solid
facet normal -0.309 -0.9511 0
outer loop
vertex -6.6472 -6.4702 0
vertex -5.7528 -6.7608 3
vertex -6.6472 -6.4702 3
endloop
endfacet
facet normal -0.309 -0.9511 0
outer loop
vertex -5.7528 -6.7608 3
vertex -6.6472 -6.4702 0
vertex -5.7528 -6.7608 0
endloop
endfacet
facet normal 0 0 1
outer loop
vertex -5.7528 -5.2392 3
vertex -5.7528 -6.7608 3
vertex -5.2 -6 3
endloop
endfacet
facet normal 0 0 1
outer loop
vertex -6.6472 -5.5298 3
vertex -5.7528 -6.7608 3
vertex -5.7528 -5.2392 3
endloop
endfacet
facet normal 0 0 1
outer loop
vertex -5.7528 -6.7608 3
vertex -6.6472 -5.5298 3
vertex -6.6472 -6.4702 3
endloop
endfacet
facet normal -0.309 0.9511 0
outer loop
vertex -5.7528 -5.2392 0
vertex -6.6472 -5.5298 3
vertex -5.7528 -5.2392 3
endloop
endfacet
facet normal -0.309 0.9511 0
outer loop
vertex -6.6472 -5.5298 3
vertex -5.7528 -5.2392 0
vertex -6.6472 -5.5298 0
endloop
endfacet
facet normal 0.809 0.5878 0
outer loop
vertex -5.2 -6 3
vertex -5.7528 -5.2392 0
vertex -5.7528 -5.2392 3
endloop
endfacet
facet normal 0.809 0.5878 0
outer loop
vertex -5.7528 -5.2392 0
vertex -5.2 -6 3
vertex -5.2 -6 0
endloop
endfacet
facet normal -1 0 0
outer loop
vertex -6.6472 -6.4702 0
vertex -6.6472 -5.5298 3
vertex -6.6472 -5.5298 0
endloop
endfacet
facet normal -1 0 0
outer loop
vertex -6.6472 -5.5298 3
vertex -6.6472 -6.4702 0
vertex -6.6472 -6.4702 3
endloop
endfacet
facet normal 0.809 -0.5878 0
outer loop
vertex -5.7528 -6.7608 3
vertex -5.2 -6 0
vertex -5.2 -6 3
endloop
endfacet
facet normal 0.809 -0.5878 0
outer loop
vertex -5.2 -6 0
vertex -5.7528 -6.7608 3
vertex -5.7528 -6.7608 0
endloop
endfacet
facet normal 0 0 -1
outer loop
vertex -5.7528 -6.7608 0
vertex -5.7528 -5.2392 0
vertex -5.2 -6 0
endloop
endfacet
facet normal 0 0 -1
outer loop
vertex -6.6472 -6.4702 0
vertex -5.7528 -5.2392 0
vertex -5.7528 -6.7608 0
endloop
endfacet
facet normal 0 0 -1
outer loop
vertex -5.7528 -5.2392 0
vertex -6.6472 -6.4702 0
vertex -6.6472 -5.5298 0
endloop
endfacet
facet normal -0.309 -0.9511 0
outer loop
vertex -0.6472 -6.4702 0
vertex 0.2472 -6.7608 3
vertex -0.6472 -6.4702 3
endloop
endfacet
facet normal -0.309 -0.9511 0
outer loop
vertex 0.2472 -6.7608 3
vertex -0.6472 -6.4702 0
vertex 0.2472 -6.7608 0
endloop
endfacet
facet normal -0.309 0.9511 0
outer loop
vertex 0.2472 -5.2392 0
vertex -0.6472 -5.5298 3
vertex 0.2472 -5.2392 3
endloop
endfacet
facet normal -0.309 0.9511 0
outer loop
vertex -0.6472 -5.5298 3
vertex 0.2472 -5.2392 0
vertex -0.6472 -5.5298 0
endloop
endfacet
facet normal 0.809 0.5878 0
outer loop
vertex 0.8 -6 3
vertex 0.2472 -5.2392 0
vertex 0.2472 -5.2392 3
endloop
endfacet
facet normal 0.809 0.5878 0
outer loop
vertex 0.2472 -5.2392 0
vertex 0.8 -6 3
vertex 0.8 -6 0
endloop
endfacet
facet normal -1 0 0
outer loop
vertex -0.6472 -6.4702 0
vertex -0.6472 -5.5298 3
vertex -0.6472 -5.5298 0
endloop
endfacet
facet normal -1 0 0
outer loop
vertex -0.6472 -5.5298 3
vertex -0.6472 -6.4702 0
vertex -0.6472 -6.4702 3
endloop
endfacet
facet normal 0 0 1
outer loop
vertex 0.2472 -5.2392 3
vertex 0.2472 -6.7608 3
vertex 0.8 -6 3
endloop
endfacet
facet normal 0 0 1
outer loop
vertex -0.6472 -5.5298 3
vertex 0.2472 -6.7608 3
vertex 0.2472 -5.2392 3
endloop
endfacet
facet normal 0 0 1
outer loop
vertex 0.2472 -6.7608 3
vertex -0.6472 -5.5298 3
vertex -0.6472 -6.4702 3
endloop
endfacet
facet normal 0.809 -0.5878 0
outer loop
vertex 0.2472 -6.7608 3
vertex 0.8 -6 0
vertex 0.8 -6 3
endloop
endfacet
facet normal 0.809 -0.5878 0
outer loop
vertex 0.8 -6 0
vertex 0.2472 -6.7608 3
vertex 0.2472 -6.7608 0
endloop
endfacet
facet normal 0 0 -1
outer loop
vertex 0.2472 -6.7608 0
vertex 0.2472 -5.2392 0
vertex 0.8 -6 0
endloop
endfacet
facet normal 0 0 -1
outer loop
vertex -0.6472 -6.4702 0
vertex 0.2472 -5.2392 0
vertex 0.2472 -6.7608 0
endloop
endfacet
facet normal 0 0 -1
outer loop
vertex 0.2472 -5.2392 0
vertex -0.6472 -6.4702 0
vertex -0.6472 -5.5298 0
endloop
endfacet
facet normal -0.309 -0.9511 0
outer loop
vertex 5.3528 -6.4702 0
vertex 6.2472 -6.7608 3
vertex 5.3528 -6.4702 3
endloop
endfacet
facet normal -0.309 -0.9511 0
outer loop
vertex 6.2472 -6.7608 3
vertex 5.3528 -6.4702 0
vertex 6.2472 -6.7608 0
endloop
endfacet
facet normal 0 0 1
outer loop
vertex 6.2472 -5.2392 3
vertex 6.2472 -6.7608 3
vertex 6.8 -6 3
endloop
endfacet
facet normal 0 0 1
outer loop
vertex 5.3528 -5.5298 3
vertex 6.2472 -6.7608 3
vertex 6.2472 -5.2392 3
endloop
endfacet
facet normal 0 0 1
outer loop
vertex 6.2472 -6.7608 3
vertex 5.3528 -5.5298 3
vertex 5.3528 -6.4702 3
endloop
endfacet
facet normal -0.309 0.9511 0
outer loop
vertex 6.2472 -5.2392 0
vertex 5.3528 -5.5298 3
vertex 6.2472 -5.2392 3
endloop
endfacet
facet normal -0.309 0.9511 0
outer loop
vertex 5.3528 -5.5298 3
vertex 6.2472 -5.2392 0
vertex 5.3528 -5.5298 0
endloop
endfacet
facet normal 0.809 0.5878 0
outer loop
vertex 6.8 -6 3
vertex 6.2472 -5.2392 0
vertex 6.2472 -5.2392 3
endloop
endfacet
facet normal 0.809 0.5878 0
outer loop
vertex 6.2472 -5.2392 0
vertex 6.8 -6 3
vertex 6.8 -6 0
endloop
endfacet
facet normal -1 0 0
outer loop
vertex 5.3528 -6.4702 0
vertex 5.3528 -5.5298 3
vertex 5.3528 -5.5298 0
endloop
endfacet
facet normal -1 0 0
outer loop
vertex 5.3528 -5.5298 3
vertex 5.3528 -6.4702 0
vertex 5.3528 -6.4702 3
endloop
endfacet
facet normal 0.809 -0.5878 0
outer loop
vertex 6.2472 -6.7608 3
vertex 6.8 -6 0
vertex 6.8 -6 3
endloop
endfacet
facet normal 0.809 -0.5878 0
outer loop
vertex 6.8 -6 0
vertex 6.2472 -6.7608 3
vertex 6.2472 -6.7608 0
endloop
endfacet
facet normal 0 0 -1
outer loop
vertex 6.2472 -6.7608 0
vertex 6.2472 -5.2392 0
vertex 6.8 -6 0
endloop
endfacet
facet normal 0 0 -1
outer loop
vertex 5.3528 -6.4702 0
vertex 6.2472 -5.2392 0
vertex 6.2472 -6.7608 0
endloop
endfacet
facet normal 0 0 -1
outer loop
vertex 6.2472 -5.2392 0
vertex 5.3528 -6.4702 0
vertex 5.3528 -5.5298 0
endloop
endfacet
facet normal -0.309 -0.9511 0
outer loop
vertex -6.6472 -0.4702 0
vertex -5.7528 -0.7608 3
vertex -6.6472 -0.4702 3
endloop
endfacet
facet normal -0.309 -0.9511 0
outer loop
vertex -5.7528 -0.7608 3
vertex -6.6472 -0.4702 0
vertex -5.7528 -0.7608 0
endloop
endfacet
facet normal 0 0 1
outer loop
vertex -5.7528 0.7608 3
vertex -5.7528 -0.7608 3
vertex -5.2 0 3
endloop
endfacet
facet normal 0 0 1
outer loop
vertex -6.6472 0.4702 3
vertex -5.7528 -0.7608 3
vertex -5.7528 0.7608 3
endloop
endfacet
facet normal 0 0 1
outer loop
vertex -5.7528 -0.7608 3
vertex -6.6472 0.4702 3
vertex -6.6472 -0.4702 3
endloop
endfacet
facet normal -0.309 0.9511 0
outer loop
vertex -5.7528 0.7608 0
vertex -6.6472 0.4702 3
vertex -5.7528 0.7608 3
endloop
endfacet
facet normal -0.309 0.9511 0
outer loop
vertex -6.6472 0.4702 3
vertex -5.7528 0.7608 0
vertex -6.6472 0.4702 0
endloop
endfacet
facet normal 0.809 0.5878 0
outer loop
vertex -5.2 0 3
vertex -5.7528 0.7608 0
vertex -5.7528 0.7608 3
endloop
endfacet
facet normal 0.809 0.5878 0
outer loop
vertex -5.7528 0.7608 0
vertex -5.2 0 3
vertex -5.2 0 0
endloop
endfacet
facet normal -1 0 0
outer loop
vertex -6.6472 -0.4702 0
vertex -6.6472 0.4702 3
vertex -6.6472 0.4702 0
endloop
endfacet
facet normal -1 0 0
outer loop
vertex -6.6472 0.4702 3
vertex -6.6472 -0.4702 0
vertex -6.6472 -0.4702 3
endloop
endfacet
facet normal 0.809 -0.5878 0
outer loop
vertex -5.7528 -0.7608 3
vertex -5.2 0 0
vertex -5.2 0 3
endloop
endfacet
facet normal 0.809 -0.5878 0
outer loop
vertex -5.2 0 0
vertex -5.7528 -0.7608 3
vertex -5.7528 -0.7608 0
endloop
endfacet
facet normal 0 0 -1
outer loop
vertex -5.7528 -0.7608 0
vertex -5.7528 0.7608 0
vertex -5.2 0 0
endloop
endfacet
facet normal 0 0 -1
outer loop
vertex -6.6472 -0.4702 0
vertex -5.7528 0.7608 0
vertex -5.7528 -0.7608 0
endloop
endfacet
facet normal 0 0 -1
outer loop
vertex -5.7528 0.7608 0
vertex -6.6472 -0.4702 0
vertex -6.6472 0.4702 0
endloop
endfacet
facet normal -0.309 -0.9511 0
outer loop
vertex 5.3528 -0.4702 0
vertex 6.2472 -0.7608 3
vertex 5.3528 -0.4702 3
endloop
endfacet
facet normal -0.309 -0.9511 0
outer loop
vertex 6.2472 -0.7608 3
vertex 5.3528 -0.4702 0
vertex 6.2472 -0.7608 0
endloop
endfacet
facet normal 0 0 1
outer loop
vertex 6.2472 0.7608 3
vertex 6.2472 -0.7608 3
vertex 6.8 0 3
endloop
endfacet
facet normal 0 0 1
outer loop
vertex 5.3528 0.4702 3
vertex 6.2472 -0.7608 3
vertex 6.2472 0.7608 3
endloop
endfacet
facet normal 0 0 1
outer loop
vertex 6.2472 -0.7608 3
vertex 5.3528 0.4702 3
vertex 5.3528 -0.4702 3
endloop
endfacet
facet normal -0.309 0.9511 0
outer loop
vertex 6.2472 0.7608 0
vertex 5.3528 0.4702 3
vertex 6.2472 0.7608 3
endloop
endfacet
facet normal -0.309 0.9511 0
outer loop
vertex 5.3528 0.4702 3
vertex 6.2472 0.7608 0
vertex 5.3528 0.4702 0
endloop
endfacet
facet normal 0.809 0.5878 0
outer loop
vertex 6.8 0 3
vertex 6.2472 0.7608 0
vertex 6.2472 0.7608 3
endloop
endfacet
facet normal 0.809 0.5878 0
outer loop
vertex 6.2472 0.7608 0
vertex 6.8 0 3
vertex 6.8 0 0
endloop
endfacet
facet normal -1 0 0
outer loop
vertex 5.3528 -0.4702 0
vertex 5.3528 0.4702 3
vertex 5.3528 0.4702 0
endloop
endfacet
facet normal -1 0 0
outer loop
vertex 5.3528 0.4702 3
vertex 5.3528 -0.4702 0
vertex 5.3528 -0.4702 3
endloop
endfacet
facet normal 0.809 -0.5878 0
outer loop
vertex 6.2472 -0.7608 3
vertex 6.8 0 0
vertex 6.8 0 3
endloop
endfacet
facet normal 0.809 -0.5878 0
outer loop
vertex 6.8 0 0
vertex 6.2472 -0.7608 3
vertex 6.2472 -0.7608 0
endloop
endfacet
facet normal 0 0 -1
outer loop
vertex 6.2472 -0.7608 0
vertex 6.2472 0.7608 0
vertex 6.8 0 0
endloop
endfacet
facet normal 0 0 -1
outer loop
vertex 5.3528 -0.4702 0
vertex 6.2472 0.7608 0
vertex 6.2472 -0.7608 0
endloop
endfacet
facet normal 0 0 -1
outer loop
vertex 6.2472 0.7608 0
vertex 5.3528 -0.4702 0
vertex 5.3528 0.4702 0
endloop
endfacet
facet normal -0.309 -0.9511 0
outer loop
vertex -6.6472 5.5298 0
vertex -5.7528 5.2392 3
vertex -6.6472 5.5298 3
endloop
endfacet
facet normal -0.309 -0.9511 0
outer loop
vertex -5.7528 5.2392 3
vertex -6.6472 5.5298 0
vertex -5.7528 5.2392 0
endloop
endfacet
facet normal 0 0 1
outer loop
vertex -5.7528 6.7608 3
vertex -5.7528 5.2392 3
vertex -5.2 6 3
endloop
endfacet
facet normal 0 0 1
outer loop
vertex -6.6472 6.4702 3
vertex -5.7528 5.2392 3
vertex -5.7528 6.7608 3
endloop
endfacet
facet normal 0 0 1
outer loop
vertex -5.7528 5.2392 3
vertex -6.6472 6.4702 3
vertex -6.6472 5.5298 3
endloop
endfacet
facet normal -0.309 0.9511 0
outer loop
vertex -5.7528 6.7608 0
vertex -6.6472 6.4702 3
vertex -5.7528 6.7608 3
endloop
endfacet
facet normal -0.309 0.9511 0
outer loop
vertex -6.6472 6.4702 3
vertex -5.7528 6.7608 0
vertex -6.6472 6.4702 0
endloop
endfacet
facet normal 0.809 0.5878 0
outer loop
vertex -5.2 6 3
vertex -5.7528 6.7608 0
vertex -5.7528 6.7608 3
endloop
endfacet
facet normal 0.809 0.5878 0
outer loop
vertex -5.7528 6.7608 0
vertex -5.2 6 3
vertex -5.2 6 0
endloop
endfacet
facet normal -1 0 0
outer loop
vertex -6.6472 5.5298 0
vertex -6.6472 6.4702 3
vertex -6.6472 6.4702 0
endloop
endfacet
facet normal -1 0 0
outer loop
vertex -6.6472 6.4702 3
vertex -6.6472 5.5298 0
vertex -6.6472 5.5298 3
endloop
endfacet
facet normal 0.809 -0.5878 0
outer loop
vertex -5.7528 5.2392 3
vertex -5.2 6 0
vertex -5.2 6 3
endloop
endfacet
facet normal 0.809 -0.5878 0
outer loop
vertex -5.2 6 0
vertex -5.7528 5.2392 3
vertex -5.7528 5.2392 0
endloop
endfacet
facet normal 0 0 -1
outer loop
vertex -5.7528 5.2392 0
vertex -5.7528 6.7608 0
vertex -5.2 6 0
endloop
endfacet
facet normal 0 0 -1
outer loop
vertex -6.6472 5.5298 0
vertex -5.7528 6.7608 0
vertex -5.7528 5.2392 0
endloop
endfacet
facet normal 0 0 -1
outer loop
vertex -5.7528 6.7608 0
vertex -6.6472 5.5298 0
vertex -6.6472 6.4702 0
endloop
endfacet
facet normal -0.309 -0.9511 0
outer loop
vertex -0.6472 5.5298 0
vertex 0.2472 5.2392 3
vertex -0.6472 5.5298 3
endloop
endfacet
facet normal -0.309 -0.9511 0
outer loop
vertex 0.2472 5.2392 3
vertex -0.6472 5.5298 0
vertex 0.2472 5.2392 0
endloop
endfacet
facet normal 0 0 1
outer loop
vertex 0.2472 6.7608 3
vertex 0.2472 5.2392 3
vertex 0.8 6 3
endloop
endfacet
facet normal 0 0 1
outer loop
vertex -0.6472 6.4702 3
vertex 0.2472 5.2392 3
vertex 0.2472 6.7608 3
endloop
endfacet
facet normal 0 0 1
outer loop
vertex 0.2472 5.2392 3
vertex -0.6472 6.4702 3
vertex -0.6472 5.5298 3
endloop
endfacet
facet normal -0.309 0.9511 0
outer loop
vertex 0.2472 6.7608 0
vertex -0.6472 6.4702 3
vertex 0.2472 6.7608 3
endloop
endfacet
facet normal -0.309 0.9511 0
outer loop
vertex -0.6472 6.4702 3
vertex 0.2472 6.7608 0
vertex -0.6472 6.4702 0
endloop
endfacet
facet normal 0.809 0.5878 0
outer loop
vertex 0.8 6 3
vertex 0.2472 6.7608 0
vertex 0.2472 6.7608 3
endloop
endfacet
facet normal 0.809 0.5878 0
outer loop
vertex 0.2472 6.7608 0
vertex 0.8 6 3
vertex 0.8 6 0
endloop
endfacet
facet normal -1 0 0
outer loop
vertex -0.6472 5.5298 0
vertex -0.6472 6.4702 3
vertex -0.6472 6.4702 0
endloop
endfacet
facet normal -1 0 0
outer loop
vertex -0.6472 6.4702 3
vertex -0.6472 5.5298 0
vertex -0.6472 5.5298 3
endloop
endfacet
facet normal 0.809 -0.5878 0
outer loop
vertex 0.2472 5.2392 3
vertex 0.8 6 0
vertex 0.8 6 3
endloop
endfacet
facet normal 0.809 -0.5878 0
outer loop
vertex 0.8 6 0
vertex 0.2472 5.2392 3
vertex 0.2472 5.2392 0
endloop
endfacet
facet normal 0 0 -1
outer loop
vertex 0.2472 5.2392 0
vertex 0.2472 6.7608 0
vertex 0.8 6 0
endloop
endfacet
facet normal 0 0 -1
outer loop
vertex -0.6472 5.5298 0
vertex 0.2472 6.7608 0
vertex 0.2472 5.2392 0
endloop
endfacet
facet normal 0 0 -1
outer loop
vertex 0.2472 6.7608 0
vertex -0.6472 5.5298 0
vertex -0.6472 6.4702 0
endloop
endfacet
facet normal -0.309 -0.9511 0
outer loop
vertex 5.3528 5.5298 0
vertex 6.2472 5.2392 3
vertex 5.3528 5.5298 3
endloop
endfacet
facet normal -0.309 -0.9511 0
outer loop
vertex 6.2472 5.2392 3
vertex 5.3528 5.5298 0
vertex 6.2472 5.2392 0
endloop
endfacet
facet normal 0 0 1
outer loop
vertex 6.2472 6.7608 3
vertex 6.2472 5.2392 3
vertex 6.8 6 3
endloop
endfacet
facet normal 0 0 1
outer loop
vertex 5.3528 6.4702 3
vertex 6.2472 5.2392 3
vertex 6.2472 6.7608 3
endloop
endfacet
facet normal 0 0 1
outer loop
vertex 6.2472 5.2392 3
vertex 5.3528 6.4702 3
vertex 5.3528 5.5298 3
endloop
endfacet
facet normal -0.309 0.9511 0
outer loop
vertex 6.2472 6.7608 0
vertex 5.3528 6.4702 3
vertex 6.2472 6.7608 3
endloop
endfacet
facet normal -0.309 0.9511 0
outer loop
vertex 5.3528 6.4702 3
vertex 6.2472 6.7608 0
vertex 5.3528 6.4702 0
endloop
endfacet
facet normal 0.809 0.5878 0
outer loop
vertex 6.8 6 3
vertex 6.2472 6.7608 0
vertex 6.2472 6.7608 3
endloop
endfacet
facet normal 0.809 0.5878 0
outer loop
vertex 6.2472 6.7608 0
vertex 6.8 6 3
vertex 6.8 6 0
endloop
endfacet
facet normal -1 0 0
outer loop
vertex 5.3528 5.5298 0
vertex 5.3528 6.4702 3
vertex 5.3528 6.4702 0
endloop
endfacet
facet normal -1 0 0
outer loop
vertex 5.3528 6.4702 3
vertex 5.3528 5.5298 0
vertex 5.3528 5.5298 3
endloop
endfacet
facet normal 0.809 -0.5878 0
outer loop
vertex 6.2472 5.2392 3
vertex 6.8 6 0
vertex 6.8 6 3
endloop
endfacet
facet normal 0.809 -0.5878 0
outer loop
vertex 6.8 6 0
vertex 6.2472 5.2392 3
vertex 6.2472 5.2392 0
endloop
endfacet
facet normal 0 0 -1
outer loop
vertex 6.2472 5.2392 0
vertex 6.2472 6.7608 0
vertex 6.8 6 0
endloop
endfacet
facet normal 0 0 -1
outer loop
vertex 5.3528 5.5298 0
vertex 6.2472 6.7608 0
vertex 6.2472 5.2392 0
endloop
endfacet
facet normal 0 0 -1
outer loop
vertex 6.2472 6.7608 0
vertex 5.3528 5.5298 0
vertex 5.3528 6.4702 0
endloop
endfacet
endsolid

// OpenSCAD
union() {
	translate([-6, -6, 0]) cylinder(r=0.8, h=3);
	translate([0, -6, 0]) cylinder(r=0.8, h=3);
	translate([6, -6, 0]) cylinder(r=0.8, h=3);
	translate([-6, 0, 0]) cylinder(r=0.8, h=3);
	translate([6, 0, 0]) cylinder(r=0.8, h=3);
	translate([-6, 6, 0]) cylinder(r=0.8, h=3);
	translate([0, 6, 0]) cylinder(r=0.8, h=3);
	translate([6, 6, 0]) cylinder(r=0.8, h=3);
}
